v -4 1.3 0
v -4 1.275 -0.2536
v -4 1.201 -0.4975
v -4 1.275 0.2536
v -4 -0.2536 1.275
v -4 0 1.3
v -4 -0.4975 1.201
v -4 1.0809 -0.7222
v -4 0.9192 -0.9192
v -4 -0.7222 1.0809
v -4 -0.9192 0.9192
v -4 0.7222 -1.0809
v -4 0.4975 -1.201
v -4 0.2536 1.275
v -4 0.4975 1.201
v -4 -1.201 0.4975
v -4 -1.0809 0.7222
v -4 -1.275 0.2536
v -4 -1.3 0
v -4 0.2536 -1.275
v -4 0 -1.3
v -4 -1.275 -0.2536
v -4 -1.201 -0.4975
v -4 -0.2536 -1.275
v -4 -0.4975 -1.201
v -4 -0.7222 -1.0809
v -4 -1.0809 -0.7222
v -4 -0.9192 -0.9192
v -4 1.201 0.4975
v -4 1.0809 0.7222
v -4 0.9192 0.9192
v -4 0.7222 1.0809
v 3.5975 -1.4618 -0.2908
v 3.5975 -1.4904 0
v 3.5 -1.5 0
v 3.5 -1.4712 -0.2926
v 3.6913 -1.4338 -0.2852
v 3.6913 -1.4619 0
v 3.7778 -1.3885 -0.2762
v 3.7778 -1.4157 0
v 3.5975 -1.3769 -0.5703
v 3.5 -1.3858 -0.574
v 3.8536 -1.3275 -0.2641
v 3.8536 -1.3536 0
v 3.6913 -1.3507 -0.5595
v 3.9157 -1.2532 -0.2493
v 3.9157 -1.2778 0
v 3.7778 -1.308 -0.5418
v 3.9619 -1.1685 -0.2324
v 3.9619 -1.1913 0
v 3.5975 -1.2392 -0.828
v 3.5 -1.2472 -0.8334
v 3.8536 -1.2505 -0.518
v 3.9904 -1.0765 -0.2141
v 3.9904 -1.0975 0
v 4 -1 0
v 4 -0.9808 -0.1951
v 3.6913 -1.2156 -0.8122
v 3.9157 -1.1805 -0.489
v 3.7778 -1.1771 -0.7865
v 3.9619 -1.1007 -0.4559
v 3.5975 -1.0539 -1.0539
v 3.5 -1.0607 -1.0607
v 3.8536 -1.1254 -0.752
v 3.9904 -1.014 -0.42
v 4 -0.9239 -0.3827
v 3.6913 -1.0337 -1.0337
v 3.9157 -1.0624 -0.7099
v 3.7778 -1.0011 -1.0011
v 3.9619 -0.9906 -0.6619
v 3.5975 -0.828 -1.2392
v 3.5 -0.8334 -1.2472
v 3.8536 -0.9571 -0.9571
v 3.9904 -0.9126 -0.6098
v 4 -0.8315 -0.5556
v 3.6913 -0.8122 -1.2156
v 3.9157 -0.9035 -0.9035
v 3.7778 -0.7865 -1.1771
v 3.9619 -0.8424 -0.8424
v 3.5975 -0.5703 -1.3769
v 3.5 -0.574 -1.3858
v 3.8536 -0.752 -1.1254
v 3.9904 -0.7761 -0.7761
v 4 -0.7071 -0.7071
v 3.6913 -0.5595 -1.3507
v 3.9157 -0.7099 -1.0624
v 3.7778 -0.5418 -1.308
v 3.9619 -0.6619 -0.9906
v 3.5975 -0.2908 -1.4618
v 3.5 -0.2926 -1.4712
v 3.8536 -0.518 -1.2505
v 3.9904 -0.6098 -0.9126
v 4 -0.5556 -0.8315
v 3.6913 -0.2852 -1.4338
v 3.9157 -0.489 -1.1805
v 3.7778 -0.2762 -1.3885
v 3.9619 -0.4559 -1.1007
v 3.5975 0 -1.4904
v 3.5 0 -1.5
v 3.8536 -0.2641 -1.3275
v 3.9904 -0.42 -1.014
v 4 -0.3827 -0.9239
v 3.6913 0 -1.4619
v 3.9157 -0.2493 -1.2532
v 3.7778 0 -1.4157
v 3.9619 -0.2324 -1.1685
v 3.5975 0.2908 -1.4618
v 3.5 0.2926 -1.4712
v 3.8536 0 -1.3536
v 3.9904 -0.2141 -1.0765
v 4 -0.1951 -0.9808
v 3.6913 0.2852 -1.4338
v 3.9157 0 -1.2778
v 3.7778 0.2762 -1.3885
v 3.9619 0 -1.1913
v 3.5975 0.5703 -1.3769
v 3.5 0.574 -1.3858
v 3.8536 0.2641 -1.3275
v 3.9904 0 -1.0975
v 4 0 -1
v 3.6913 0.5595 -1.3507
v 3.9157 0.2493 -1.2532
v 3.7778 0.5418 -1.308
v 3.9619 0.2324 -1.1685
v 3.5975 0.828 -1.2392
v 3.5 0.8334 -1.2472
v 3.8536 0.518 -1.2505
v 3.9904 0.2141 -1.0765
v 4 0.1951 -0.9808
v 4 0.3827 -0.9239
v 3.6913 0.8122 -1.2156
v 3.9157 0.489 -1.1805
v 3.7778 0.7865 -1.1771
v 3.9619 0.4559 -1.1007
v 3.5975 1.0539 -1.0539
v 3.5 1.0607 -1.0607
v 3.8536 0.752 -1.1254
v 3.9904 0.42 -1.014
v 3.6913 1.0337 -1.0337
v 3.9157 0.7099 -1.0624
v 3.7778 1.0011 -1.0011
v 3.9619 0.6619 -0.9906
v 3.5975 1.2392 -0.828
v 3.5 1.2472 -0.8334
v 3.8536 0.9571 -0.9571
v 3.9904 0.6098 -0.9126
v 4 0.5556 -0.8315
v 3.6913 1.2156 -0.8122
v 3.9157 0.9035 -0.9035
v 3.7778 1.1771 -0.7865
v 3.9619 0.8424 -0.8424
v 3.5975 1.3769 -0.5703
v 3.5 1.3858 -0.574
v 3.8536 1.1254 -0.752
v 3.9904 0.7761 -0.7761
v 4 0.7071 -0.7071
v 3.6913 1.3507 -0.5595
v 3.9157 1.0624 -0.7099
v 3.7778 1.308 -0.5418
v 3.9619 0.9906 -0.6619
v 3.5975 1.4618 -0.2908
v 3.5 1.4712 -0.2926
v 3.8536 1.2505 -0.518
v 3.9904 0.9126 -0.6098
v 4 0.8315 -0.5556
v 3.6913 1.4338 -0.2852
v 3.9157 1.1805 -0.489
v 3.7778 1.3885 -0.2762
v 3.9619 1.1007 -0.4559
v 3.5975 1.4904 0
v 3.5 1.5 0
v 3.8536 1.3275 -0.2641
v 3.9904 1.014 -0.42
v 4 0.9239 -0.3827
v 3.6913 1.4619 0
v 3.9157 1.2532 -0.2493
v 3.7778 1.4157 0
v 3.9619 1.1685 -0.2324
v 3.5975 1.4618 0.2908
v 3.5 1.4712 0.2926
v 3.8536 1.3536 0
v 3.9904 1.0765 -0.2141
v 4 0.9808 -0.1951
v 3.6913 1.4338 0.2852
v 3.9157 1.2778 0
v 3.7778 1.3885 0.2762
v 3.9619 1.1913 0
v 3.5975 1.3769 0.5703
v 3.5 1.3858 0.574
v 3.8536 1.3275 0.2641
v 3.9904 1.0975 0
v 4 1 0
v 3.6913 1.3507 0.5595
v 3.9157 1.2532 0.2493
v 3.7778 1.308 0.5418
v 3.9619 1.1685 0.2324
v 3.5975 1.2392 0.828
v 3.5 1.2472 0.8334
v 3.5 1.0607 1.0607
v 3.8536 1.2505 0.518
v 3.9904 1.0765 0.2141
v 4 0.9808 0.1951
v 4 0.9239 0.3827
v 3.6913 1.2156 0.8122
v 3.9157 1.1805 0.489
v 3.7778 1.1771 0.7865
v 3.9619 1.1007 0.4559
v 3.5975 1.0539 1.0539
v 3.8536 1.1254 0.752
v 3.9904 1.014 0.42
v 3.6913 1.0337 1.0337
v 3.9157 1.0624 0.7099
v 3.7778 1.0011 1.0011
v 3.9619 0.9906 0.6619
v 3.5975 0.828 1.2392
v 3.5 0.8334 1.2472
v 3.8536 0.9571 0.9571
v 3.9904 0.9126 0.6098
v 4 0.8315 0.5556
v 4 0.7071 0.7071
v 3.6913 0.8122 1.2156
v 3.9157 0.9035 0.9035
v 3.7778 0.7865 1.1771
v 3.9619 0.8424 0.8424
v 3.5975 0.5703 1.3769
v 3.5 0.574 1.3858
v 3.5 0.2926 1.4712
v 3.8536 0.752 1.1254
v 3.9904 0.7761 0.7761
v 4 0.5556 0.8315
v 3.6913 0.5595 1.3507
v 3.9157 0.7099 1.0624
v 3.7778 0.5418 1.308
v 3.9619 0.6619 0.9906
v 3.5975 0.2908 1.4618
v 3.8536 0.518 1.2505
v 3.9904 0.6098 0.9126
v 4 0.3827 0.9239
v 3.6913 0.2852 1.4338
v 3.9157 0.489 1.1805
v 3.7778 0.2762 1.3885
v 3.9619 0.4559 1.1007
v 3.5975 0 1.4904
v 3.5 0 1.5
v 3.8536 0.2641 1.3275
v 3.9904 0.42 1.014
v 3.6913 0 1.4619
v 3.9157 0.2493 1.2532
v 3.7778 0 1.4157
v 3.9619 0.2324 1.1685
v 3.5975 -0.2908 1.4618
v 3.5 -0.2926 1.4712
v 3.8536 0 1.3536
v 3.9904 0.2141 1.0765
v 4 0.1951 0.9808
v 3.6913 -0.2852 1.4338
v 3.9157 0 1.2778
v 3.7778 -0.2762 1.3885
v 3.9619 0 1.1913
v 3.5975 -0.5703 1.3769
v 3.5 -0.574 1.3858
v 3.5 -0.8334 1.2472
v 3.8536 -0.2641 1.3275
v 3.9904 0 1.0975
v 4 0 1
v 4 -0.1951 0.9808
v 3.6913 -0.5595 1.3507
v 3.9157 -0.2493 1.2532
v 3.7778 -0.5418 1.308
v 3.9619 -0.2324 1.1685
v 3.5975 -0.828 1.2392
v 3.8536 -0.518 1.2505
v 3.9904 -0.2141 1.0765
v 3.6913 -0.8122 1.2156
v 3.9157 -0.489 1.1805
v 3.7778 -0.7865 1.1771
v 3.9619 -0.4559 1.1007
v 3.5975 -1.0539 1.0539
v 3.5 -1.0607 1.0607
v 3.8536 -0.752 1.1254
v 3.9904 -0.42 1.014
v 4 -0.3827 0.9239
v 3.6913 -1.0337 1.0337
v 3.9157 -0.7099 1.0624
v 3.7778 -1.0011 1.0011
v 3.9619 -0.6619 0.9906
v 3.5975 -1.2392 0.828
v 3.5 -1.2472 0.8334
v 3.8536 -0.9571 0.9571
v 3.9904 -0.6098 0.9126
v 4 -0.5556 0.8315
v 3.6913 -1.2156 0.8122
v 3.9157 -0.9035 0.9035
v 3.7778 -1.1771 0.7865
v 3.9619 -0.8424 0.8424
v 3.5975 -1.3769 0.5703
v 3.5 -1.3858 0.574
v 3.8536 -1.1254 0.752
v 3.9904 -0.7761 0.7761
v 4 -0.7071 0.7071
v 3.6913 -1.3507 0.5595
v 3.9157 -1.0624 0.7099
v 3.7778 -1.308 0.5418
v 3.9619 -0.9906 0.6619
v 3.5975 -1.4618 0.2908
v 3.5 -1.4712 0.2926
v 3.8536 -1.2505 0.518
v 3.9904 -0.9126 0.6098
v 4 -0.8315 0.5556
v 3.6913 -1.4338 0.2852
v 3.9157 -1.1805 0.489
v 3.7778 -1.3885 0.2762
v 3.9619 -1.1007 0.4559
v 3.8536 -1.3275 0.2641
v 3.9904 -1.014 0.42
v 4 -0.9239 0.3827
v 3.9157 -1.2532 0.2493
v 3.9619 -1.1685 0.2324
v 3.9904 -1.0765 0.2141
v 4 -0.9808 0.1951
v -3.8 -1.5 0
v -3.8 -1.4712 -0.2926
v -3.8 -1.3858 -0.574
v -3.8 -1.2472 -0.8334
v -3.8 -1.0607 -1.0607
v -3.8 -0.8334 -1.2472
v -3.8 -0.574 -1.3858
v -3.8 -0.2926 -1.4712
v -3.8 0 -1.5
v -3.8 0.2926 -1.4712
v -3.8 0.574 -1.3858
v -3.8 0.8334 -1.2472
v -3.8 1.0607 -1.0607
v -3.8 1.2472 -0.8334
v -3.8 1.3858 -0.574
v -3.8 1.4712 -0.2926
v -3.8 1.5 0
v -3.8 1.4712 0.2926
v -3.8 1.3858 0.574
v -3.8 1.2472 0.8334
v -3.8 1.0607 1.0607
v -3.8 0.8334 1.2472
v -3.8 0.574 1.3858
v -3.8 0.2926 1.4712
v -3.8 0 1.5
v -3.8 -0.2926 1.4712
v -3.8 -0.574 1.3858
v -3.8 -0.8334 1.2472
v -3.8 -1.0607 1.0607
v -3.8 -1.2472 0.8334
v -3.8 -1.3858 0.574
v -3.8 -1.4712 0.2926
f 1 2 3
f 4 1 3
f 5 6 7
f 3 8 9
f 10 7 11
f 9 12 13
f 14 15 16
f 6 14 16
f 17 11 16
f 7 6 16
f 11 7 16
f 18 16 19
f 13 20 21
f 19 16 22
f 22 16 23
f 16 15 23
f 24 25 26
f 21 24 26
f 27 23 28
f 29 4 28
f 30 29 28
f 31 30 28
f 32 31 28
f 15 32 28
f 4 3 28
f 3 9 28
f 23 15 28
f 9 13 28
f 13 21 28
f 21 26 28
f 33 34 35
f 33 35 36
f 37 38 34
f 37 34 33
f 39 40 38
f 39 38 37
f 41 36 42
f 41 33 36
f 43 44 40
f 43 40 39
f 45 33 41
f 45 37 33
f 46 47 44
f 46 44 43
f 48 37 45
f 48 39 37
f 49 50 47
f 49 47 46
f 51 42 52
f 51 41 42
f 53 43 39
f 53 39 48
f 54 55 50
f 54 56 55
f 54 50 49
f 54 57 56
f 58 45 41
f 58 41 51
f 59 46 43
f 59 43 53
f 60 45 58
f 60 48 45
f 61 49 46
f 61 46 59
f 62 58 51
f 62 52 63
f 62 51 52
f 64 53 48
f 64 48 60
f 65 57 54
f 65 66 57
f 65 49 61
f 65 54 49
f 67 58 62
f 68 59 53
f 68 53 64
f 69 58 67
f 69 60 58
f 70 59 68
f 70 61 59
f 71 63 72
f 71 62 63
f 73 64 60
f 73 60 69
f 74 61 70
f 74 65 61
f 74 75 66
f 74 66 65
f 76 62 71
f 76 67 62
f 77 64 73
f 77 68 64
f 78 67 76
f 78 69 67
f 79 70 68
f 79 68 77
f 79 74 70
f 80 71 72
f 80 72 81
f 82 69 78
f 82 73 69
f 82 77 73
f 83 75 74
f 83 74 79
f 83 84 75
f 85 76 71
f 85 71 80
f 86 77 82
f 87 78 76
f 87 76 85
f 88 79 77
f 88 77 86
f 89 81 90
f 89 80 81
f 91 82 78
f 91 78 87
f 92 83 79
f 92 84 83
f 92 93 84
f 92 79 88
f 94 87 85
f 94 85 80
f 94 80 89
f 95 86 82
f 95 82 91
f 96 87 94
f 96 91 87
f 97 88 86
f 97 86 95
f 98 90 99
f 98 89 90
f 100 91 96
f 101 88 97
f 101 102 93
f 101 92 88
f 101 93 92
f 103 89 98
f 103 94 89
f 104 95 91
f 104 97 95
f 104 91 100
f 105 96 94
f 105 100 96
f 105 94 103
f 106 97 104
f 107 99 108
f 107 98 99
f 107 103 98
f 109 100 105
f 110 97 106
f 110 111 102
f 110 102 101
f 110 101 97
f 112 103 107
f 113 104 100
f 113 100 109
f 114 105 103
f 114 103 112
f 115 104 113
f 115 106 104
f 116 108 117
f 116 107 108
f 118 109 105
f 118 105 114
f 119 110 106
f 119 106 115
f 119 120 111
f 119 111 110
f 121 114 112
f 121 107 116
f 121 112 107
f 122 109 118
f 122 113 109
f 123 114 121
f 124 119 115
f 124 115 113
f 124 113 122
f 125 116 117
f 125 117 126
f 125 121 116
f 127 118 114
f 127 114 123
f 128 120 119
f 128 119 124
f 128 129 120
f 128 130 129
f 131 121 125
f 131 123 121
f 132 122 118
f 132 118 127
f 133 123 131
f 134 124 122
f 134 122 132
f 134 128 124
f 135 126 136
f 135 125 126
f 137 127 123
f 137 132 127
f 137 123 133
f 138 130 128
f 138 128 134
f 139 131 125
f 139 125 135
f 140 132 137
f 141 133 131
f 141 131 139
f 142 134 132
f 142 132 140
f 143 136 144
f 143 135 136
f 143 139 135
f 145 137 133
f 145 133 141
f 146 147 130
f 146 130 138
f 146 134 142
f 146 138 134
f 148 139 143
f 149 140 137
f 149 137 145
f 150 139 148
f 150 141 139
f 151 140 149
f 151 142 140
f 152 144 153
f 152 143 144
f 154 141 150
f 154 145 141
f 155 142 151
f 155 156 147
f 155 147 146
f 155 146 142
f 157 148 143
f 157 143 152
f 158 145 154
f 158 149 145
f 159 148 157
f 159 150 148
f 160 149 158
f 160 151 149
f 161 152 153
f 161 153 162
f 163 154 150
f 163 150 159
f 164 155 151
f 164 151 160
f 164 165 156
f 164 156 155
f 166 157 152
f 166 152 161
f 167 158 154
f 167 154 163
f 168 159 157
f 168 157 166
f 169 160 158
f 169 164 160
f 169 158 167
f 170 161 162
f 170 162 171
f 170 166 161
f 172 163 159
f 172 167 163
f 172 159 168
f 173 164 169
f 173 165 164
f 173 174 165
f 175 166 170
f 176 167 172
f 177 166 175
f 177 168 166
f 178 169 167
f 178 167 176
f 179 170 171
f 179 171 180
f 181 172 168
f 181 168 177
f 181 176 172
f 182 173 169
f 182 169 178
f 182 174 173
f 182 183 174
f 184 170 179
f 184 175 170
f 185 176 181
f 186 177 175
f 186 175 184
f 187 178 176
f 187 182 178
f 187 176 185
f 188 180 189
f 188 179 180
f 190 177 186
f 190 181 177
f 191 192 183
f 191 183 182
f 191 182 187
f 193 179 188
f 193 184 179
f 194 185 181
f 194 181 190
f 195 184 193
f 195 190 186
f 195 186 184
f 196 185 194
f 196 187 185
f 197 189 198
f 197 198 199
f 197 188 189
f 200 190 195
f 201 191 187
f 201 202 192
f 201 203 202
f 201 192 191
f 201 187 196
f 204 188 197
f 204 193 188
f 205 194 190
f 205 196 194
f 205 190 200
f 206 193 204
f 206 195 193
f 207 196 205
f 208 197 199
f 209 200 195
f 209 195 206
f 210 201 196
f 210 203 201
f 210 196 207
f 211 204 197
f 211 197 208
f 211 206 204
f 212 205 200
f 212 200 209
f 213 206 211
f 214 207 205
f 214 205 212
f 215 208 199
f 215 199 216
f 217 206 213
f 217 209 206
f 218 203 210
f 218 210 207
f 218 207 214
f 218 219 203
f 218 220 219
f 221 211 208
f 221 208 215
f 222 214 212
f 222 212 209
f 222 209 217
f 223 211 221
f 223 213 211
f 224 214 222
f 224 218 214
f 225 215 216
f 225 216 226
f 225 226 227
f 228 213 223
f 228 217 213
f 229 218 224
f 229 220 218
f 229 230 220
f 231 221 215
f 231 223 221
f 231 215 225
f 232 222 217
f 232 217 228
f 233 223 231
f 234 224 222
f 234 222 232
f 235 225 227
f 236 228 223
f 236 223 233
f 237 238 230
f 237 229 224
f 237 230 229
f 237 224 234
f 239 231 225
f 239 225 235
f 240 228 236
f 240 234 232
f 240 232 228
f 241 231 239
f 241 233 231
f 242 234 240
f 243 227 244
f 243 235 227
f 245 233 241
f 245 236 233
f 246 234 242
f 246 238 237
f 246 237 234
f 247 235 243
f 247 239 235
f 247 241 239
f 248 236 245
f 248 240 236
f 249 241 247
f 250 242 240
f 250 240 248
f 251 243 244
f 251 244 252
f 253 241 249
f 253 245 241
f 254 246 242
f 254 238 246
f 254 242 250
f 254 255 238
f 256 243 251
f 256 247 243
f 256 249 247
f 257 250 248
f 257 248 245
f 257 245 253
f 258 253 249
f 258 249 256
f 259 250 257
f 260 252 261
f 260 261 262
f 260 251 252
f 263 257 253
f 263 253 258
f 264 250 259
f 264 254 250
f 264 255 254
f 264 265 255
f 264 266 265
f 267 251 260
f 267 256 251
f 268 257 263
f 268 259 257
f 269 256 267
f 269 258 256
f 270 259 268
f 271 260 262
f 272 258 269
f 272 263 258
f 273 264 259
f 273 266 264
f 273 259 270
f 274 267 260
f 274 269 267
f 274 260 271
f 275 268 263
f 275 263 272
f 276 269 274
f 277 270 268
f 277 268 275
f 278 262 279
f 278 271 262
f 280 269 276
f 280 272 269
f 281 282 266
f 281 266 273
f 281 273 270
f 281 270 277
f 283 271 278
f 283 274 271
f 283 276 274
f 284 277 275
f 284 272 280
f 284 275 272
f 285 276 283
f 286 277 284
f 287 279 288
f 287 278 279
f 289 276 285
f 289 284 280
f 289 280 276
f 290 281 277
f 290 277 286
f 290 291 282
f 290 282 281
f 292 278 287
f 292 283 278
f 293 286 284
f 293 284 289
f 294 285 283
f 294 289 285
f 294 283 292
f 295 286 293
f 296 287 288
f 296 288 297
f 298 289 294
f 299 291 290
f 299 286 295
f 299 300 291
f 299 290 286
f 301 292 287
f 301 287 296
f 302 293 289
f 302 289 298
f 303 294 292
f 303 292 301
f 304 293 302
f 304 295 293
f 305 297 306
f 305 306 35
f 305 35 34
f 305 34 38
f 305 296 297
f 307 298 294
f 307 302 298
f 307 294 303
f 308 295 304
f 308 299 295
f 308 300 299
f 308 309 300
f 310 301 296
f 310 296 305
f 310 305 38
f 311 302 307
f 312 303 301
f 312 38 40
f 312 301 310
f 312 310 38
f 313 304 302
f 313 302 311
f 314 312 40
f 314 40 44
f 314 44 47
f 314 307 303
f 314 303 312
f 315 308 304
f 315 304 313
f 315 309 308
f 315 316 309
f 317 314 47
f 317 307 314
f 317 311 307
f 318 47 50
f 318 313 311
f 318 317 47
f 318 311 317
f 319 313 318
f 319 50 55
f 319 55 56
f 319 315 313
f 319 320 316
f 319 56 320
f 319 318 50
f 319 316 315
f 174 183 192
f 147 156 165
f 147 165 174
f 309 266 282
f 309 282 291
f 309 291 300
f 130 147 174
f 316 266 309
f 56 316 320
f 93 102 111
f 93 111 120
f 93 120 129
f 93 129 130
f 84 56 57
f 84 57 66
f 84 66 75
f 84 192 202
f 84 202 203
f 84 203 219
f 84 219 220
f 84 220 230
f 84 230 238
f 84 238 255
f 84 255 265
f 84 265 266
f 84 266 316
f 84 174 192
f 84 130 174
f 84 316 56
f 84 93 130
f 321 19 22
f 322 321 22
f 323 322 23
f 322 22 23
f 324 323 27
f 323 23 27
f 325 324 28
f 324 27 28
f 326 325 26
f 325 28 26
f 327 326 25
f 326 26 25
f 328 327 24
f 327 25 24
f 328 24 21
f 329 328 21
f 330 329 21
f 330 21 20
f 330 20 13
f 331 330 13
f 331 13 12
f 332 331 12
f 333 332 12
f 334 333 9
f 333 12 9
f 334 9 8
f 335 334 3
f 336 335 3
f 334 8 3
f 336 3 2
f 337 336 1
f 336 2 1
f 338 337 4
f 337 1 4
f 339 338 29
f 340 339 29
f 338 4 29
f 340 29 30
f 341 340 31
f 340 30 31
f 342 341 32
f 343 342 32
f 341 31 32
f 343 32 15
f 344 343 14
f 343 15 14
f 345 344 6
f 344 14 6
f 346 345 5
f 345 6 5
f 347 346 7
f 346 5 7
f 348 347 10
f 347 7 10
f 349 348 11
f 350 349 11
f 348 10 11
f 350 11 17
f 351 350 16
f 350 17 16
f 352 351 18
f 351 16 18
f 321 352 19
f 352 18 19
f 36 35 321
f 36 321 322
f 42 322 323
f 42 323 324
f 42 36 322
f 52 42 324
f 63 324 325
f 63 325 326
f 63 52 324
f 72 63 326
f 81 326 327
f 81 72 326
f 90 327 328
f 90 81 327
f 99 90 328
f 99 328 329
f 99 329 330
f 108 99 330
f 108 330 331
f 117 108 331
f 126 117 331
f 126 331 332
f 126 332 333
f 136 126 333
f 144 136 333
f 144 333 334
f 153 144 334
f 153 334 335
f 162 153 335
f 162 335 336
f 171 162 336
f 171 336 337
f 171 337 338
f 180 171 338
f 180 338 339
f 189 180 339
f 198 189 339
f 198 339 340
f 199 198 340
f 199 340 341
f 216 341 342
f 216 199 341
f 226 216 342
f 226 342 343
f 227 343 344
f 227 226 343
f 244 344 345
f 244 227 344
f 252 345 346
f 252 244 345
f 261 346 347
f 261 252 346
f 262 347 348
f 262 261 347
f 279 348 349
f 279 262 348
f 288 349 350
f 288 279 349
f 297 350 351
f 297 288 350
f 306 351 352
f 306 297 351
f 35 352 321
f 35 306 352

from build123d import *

# Parameters (mm, degrees)
SKETCH1_R           = 1.5
BOSS_EXTRUDE1_DEPTH = 4
FILLET1_R           = 0.5
CHAMFER1_SIZE       = 0.2


with BuildPart() as part:
    # Sketch1 → Boss-Extrude1 (new body, symmetric)
    with BuildSketch(Plane(origin=(0, 0, 0), x_dir=(0, -1, 0), z_dir=(1, 0, 0))):
        Circle(SKETCH1_R)
    extrude(amount=BOSS_EXTRUDE1_DEPTH, both=True)

    # Fillet1
    fillet1_edges = [part.edges().sort_by_distance(p)[0] for p in [
        (4, 1.5, 0),
    ]]
    fillet(fillet1_edges, radius=FILLET1_R)

    # Chamfer1
    chamfer1_edges = [part.edges().sort_by_distance(p)[0] for p in [
        (-4, 1.5, 0),
    ]]
    chamfer(chamfer1_edges, length=CHAMFER1_SIZE)


solid = part.part
